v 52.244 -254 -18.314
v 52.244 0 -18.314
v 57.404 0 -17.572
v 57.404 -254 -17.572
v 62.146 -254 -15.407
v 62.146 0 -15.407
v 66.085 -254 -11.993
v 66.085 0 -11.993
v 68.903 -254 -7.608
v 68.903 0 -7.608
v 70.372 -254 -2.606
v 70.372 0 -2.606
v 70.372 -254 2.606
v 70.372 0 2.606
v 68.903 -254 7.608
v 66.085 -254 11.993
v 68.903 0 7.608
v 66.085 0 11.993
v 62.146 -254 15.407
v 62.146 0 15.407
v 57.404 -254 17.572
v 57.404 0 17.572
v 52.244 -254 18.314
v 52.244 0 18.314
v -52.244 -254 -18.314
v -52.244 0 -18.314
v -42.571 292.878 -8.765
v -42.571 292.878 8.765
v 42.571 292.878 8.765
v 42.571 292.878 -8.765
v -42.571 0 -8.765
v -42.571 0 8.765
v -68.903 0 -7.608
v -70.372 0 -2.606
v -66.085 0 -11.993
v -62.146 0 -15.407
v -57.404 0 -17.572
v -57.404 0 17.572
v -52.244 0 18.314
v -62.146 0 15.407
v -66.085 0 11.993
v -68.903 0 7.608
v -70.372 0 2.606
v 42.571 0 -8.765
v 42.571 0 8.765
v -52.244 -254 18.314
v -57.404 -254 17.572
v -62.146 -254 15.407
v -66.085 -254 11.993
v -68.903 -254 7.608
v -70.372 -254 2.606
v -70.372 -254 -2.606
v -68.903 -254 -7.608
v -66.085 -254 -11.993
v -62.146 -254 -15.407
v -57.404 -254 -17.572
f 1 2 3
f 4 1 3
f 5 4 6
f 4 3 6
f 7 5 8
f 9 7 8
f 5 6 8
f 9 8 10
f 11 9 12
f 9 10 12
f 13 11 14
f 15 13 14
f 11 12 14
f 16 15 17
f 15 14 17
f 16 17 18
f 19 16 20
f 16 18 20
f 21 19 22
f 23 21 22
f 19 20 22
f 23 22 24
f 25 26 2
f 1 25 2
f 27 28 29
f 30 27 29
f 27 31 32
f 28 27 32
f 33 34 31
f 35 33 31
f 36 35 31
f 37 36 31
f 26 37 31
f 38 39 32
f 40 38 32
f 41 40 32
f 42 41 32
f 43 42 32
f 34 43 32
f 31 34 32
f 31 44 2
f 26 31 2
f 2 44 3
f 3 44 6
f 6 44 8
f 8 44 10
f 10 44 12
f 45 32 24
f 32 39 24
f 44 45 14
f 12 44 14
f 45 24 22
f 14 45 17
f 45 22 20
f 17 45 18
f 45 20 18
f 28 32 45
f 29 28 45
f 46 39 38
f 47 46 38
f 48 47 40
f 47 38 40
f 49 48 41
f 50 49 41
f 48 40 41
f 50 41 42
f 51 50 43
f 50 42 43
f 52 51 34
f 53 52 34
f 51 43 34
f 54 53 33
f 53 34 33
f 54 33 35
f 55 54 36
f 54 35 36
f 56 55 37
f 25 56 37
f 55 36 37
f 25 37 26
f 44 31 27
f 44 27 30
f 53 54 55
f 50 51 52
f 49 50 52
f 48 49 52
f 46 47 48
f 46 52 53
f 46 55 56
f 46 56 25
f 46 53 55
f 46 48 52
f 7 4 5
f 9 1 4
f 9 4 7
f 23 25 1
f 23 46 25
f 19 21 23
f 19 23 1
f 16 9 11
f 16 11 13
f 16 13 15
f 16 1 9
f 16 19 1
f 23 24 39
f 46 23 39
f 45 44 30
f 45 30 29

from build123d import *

# Parameters (mm, degrees)
F1_DEPTH = 254
F2_W     = 85.141710937
F2_H     = 17.5291653723
F3_DEPTH = 292.8777724


# Not quite as in the source:
# - an extrude ends at something that could not be found from the text; its depth is read off the source's solid


with BuildPart() as f1:
    # F0 (on Front) → F1 (new body)
    with BuildSketch(Plane.XZ):
        with BuildLine():
            Line((52.2444248199, 18.3139387518), (-52.2444248199, 18.3139387518))
            ThreePointArc((-52.2444248199, 18.3139387518), (-70.5583635718, 0), (-52.2444248199, -18.3139387518))
            Line((-52.2444248199, -18.3139387518), (52.2444248199, -18.3139387518))
            ThreePointArc((52.2444248199, -18.3139387518), (70.5583635718, 0), (52.2444248199, 18.3139387518))
        make_face()
    extrude(amount=F1_DEPTH)

    # F2 (on Front) → F3 (join, through all)
    with BuildSketch(Plane.XZ):
        Rectangle(F2_W, F2_H)
    extrude(amount=-F3_DEPTH)


solid = f1.part
